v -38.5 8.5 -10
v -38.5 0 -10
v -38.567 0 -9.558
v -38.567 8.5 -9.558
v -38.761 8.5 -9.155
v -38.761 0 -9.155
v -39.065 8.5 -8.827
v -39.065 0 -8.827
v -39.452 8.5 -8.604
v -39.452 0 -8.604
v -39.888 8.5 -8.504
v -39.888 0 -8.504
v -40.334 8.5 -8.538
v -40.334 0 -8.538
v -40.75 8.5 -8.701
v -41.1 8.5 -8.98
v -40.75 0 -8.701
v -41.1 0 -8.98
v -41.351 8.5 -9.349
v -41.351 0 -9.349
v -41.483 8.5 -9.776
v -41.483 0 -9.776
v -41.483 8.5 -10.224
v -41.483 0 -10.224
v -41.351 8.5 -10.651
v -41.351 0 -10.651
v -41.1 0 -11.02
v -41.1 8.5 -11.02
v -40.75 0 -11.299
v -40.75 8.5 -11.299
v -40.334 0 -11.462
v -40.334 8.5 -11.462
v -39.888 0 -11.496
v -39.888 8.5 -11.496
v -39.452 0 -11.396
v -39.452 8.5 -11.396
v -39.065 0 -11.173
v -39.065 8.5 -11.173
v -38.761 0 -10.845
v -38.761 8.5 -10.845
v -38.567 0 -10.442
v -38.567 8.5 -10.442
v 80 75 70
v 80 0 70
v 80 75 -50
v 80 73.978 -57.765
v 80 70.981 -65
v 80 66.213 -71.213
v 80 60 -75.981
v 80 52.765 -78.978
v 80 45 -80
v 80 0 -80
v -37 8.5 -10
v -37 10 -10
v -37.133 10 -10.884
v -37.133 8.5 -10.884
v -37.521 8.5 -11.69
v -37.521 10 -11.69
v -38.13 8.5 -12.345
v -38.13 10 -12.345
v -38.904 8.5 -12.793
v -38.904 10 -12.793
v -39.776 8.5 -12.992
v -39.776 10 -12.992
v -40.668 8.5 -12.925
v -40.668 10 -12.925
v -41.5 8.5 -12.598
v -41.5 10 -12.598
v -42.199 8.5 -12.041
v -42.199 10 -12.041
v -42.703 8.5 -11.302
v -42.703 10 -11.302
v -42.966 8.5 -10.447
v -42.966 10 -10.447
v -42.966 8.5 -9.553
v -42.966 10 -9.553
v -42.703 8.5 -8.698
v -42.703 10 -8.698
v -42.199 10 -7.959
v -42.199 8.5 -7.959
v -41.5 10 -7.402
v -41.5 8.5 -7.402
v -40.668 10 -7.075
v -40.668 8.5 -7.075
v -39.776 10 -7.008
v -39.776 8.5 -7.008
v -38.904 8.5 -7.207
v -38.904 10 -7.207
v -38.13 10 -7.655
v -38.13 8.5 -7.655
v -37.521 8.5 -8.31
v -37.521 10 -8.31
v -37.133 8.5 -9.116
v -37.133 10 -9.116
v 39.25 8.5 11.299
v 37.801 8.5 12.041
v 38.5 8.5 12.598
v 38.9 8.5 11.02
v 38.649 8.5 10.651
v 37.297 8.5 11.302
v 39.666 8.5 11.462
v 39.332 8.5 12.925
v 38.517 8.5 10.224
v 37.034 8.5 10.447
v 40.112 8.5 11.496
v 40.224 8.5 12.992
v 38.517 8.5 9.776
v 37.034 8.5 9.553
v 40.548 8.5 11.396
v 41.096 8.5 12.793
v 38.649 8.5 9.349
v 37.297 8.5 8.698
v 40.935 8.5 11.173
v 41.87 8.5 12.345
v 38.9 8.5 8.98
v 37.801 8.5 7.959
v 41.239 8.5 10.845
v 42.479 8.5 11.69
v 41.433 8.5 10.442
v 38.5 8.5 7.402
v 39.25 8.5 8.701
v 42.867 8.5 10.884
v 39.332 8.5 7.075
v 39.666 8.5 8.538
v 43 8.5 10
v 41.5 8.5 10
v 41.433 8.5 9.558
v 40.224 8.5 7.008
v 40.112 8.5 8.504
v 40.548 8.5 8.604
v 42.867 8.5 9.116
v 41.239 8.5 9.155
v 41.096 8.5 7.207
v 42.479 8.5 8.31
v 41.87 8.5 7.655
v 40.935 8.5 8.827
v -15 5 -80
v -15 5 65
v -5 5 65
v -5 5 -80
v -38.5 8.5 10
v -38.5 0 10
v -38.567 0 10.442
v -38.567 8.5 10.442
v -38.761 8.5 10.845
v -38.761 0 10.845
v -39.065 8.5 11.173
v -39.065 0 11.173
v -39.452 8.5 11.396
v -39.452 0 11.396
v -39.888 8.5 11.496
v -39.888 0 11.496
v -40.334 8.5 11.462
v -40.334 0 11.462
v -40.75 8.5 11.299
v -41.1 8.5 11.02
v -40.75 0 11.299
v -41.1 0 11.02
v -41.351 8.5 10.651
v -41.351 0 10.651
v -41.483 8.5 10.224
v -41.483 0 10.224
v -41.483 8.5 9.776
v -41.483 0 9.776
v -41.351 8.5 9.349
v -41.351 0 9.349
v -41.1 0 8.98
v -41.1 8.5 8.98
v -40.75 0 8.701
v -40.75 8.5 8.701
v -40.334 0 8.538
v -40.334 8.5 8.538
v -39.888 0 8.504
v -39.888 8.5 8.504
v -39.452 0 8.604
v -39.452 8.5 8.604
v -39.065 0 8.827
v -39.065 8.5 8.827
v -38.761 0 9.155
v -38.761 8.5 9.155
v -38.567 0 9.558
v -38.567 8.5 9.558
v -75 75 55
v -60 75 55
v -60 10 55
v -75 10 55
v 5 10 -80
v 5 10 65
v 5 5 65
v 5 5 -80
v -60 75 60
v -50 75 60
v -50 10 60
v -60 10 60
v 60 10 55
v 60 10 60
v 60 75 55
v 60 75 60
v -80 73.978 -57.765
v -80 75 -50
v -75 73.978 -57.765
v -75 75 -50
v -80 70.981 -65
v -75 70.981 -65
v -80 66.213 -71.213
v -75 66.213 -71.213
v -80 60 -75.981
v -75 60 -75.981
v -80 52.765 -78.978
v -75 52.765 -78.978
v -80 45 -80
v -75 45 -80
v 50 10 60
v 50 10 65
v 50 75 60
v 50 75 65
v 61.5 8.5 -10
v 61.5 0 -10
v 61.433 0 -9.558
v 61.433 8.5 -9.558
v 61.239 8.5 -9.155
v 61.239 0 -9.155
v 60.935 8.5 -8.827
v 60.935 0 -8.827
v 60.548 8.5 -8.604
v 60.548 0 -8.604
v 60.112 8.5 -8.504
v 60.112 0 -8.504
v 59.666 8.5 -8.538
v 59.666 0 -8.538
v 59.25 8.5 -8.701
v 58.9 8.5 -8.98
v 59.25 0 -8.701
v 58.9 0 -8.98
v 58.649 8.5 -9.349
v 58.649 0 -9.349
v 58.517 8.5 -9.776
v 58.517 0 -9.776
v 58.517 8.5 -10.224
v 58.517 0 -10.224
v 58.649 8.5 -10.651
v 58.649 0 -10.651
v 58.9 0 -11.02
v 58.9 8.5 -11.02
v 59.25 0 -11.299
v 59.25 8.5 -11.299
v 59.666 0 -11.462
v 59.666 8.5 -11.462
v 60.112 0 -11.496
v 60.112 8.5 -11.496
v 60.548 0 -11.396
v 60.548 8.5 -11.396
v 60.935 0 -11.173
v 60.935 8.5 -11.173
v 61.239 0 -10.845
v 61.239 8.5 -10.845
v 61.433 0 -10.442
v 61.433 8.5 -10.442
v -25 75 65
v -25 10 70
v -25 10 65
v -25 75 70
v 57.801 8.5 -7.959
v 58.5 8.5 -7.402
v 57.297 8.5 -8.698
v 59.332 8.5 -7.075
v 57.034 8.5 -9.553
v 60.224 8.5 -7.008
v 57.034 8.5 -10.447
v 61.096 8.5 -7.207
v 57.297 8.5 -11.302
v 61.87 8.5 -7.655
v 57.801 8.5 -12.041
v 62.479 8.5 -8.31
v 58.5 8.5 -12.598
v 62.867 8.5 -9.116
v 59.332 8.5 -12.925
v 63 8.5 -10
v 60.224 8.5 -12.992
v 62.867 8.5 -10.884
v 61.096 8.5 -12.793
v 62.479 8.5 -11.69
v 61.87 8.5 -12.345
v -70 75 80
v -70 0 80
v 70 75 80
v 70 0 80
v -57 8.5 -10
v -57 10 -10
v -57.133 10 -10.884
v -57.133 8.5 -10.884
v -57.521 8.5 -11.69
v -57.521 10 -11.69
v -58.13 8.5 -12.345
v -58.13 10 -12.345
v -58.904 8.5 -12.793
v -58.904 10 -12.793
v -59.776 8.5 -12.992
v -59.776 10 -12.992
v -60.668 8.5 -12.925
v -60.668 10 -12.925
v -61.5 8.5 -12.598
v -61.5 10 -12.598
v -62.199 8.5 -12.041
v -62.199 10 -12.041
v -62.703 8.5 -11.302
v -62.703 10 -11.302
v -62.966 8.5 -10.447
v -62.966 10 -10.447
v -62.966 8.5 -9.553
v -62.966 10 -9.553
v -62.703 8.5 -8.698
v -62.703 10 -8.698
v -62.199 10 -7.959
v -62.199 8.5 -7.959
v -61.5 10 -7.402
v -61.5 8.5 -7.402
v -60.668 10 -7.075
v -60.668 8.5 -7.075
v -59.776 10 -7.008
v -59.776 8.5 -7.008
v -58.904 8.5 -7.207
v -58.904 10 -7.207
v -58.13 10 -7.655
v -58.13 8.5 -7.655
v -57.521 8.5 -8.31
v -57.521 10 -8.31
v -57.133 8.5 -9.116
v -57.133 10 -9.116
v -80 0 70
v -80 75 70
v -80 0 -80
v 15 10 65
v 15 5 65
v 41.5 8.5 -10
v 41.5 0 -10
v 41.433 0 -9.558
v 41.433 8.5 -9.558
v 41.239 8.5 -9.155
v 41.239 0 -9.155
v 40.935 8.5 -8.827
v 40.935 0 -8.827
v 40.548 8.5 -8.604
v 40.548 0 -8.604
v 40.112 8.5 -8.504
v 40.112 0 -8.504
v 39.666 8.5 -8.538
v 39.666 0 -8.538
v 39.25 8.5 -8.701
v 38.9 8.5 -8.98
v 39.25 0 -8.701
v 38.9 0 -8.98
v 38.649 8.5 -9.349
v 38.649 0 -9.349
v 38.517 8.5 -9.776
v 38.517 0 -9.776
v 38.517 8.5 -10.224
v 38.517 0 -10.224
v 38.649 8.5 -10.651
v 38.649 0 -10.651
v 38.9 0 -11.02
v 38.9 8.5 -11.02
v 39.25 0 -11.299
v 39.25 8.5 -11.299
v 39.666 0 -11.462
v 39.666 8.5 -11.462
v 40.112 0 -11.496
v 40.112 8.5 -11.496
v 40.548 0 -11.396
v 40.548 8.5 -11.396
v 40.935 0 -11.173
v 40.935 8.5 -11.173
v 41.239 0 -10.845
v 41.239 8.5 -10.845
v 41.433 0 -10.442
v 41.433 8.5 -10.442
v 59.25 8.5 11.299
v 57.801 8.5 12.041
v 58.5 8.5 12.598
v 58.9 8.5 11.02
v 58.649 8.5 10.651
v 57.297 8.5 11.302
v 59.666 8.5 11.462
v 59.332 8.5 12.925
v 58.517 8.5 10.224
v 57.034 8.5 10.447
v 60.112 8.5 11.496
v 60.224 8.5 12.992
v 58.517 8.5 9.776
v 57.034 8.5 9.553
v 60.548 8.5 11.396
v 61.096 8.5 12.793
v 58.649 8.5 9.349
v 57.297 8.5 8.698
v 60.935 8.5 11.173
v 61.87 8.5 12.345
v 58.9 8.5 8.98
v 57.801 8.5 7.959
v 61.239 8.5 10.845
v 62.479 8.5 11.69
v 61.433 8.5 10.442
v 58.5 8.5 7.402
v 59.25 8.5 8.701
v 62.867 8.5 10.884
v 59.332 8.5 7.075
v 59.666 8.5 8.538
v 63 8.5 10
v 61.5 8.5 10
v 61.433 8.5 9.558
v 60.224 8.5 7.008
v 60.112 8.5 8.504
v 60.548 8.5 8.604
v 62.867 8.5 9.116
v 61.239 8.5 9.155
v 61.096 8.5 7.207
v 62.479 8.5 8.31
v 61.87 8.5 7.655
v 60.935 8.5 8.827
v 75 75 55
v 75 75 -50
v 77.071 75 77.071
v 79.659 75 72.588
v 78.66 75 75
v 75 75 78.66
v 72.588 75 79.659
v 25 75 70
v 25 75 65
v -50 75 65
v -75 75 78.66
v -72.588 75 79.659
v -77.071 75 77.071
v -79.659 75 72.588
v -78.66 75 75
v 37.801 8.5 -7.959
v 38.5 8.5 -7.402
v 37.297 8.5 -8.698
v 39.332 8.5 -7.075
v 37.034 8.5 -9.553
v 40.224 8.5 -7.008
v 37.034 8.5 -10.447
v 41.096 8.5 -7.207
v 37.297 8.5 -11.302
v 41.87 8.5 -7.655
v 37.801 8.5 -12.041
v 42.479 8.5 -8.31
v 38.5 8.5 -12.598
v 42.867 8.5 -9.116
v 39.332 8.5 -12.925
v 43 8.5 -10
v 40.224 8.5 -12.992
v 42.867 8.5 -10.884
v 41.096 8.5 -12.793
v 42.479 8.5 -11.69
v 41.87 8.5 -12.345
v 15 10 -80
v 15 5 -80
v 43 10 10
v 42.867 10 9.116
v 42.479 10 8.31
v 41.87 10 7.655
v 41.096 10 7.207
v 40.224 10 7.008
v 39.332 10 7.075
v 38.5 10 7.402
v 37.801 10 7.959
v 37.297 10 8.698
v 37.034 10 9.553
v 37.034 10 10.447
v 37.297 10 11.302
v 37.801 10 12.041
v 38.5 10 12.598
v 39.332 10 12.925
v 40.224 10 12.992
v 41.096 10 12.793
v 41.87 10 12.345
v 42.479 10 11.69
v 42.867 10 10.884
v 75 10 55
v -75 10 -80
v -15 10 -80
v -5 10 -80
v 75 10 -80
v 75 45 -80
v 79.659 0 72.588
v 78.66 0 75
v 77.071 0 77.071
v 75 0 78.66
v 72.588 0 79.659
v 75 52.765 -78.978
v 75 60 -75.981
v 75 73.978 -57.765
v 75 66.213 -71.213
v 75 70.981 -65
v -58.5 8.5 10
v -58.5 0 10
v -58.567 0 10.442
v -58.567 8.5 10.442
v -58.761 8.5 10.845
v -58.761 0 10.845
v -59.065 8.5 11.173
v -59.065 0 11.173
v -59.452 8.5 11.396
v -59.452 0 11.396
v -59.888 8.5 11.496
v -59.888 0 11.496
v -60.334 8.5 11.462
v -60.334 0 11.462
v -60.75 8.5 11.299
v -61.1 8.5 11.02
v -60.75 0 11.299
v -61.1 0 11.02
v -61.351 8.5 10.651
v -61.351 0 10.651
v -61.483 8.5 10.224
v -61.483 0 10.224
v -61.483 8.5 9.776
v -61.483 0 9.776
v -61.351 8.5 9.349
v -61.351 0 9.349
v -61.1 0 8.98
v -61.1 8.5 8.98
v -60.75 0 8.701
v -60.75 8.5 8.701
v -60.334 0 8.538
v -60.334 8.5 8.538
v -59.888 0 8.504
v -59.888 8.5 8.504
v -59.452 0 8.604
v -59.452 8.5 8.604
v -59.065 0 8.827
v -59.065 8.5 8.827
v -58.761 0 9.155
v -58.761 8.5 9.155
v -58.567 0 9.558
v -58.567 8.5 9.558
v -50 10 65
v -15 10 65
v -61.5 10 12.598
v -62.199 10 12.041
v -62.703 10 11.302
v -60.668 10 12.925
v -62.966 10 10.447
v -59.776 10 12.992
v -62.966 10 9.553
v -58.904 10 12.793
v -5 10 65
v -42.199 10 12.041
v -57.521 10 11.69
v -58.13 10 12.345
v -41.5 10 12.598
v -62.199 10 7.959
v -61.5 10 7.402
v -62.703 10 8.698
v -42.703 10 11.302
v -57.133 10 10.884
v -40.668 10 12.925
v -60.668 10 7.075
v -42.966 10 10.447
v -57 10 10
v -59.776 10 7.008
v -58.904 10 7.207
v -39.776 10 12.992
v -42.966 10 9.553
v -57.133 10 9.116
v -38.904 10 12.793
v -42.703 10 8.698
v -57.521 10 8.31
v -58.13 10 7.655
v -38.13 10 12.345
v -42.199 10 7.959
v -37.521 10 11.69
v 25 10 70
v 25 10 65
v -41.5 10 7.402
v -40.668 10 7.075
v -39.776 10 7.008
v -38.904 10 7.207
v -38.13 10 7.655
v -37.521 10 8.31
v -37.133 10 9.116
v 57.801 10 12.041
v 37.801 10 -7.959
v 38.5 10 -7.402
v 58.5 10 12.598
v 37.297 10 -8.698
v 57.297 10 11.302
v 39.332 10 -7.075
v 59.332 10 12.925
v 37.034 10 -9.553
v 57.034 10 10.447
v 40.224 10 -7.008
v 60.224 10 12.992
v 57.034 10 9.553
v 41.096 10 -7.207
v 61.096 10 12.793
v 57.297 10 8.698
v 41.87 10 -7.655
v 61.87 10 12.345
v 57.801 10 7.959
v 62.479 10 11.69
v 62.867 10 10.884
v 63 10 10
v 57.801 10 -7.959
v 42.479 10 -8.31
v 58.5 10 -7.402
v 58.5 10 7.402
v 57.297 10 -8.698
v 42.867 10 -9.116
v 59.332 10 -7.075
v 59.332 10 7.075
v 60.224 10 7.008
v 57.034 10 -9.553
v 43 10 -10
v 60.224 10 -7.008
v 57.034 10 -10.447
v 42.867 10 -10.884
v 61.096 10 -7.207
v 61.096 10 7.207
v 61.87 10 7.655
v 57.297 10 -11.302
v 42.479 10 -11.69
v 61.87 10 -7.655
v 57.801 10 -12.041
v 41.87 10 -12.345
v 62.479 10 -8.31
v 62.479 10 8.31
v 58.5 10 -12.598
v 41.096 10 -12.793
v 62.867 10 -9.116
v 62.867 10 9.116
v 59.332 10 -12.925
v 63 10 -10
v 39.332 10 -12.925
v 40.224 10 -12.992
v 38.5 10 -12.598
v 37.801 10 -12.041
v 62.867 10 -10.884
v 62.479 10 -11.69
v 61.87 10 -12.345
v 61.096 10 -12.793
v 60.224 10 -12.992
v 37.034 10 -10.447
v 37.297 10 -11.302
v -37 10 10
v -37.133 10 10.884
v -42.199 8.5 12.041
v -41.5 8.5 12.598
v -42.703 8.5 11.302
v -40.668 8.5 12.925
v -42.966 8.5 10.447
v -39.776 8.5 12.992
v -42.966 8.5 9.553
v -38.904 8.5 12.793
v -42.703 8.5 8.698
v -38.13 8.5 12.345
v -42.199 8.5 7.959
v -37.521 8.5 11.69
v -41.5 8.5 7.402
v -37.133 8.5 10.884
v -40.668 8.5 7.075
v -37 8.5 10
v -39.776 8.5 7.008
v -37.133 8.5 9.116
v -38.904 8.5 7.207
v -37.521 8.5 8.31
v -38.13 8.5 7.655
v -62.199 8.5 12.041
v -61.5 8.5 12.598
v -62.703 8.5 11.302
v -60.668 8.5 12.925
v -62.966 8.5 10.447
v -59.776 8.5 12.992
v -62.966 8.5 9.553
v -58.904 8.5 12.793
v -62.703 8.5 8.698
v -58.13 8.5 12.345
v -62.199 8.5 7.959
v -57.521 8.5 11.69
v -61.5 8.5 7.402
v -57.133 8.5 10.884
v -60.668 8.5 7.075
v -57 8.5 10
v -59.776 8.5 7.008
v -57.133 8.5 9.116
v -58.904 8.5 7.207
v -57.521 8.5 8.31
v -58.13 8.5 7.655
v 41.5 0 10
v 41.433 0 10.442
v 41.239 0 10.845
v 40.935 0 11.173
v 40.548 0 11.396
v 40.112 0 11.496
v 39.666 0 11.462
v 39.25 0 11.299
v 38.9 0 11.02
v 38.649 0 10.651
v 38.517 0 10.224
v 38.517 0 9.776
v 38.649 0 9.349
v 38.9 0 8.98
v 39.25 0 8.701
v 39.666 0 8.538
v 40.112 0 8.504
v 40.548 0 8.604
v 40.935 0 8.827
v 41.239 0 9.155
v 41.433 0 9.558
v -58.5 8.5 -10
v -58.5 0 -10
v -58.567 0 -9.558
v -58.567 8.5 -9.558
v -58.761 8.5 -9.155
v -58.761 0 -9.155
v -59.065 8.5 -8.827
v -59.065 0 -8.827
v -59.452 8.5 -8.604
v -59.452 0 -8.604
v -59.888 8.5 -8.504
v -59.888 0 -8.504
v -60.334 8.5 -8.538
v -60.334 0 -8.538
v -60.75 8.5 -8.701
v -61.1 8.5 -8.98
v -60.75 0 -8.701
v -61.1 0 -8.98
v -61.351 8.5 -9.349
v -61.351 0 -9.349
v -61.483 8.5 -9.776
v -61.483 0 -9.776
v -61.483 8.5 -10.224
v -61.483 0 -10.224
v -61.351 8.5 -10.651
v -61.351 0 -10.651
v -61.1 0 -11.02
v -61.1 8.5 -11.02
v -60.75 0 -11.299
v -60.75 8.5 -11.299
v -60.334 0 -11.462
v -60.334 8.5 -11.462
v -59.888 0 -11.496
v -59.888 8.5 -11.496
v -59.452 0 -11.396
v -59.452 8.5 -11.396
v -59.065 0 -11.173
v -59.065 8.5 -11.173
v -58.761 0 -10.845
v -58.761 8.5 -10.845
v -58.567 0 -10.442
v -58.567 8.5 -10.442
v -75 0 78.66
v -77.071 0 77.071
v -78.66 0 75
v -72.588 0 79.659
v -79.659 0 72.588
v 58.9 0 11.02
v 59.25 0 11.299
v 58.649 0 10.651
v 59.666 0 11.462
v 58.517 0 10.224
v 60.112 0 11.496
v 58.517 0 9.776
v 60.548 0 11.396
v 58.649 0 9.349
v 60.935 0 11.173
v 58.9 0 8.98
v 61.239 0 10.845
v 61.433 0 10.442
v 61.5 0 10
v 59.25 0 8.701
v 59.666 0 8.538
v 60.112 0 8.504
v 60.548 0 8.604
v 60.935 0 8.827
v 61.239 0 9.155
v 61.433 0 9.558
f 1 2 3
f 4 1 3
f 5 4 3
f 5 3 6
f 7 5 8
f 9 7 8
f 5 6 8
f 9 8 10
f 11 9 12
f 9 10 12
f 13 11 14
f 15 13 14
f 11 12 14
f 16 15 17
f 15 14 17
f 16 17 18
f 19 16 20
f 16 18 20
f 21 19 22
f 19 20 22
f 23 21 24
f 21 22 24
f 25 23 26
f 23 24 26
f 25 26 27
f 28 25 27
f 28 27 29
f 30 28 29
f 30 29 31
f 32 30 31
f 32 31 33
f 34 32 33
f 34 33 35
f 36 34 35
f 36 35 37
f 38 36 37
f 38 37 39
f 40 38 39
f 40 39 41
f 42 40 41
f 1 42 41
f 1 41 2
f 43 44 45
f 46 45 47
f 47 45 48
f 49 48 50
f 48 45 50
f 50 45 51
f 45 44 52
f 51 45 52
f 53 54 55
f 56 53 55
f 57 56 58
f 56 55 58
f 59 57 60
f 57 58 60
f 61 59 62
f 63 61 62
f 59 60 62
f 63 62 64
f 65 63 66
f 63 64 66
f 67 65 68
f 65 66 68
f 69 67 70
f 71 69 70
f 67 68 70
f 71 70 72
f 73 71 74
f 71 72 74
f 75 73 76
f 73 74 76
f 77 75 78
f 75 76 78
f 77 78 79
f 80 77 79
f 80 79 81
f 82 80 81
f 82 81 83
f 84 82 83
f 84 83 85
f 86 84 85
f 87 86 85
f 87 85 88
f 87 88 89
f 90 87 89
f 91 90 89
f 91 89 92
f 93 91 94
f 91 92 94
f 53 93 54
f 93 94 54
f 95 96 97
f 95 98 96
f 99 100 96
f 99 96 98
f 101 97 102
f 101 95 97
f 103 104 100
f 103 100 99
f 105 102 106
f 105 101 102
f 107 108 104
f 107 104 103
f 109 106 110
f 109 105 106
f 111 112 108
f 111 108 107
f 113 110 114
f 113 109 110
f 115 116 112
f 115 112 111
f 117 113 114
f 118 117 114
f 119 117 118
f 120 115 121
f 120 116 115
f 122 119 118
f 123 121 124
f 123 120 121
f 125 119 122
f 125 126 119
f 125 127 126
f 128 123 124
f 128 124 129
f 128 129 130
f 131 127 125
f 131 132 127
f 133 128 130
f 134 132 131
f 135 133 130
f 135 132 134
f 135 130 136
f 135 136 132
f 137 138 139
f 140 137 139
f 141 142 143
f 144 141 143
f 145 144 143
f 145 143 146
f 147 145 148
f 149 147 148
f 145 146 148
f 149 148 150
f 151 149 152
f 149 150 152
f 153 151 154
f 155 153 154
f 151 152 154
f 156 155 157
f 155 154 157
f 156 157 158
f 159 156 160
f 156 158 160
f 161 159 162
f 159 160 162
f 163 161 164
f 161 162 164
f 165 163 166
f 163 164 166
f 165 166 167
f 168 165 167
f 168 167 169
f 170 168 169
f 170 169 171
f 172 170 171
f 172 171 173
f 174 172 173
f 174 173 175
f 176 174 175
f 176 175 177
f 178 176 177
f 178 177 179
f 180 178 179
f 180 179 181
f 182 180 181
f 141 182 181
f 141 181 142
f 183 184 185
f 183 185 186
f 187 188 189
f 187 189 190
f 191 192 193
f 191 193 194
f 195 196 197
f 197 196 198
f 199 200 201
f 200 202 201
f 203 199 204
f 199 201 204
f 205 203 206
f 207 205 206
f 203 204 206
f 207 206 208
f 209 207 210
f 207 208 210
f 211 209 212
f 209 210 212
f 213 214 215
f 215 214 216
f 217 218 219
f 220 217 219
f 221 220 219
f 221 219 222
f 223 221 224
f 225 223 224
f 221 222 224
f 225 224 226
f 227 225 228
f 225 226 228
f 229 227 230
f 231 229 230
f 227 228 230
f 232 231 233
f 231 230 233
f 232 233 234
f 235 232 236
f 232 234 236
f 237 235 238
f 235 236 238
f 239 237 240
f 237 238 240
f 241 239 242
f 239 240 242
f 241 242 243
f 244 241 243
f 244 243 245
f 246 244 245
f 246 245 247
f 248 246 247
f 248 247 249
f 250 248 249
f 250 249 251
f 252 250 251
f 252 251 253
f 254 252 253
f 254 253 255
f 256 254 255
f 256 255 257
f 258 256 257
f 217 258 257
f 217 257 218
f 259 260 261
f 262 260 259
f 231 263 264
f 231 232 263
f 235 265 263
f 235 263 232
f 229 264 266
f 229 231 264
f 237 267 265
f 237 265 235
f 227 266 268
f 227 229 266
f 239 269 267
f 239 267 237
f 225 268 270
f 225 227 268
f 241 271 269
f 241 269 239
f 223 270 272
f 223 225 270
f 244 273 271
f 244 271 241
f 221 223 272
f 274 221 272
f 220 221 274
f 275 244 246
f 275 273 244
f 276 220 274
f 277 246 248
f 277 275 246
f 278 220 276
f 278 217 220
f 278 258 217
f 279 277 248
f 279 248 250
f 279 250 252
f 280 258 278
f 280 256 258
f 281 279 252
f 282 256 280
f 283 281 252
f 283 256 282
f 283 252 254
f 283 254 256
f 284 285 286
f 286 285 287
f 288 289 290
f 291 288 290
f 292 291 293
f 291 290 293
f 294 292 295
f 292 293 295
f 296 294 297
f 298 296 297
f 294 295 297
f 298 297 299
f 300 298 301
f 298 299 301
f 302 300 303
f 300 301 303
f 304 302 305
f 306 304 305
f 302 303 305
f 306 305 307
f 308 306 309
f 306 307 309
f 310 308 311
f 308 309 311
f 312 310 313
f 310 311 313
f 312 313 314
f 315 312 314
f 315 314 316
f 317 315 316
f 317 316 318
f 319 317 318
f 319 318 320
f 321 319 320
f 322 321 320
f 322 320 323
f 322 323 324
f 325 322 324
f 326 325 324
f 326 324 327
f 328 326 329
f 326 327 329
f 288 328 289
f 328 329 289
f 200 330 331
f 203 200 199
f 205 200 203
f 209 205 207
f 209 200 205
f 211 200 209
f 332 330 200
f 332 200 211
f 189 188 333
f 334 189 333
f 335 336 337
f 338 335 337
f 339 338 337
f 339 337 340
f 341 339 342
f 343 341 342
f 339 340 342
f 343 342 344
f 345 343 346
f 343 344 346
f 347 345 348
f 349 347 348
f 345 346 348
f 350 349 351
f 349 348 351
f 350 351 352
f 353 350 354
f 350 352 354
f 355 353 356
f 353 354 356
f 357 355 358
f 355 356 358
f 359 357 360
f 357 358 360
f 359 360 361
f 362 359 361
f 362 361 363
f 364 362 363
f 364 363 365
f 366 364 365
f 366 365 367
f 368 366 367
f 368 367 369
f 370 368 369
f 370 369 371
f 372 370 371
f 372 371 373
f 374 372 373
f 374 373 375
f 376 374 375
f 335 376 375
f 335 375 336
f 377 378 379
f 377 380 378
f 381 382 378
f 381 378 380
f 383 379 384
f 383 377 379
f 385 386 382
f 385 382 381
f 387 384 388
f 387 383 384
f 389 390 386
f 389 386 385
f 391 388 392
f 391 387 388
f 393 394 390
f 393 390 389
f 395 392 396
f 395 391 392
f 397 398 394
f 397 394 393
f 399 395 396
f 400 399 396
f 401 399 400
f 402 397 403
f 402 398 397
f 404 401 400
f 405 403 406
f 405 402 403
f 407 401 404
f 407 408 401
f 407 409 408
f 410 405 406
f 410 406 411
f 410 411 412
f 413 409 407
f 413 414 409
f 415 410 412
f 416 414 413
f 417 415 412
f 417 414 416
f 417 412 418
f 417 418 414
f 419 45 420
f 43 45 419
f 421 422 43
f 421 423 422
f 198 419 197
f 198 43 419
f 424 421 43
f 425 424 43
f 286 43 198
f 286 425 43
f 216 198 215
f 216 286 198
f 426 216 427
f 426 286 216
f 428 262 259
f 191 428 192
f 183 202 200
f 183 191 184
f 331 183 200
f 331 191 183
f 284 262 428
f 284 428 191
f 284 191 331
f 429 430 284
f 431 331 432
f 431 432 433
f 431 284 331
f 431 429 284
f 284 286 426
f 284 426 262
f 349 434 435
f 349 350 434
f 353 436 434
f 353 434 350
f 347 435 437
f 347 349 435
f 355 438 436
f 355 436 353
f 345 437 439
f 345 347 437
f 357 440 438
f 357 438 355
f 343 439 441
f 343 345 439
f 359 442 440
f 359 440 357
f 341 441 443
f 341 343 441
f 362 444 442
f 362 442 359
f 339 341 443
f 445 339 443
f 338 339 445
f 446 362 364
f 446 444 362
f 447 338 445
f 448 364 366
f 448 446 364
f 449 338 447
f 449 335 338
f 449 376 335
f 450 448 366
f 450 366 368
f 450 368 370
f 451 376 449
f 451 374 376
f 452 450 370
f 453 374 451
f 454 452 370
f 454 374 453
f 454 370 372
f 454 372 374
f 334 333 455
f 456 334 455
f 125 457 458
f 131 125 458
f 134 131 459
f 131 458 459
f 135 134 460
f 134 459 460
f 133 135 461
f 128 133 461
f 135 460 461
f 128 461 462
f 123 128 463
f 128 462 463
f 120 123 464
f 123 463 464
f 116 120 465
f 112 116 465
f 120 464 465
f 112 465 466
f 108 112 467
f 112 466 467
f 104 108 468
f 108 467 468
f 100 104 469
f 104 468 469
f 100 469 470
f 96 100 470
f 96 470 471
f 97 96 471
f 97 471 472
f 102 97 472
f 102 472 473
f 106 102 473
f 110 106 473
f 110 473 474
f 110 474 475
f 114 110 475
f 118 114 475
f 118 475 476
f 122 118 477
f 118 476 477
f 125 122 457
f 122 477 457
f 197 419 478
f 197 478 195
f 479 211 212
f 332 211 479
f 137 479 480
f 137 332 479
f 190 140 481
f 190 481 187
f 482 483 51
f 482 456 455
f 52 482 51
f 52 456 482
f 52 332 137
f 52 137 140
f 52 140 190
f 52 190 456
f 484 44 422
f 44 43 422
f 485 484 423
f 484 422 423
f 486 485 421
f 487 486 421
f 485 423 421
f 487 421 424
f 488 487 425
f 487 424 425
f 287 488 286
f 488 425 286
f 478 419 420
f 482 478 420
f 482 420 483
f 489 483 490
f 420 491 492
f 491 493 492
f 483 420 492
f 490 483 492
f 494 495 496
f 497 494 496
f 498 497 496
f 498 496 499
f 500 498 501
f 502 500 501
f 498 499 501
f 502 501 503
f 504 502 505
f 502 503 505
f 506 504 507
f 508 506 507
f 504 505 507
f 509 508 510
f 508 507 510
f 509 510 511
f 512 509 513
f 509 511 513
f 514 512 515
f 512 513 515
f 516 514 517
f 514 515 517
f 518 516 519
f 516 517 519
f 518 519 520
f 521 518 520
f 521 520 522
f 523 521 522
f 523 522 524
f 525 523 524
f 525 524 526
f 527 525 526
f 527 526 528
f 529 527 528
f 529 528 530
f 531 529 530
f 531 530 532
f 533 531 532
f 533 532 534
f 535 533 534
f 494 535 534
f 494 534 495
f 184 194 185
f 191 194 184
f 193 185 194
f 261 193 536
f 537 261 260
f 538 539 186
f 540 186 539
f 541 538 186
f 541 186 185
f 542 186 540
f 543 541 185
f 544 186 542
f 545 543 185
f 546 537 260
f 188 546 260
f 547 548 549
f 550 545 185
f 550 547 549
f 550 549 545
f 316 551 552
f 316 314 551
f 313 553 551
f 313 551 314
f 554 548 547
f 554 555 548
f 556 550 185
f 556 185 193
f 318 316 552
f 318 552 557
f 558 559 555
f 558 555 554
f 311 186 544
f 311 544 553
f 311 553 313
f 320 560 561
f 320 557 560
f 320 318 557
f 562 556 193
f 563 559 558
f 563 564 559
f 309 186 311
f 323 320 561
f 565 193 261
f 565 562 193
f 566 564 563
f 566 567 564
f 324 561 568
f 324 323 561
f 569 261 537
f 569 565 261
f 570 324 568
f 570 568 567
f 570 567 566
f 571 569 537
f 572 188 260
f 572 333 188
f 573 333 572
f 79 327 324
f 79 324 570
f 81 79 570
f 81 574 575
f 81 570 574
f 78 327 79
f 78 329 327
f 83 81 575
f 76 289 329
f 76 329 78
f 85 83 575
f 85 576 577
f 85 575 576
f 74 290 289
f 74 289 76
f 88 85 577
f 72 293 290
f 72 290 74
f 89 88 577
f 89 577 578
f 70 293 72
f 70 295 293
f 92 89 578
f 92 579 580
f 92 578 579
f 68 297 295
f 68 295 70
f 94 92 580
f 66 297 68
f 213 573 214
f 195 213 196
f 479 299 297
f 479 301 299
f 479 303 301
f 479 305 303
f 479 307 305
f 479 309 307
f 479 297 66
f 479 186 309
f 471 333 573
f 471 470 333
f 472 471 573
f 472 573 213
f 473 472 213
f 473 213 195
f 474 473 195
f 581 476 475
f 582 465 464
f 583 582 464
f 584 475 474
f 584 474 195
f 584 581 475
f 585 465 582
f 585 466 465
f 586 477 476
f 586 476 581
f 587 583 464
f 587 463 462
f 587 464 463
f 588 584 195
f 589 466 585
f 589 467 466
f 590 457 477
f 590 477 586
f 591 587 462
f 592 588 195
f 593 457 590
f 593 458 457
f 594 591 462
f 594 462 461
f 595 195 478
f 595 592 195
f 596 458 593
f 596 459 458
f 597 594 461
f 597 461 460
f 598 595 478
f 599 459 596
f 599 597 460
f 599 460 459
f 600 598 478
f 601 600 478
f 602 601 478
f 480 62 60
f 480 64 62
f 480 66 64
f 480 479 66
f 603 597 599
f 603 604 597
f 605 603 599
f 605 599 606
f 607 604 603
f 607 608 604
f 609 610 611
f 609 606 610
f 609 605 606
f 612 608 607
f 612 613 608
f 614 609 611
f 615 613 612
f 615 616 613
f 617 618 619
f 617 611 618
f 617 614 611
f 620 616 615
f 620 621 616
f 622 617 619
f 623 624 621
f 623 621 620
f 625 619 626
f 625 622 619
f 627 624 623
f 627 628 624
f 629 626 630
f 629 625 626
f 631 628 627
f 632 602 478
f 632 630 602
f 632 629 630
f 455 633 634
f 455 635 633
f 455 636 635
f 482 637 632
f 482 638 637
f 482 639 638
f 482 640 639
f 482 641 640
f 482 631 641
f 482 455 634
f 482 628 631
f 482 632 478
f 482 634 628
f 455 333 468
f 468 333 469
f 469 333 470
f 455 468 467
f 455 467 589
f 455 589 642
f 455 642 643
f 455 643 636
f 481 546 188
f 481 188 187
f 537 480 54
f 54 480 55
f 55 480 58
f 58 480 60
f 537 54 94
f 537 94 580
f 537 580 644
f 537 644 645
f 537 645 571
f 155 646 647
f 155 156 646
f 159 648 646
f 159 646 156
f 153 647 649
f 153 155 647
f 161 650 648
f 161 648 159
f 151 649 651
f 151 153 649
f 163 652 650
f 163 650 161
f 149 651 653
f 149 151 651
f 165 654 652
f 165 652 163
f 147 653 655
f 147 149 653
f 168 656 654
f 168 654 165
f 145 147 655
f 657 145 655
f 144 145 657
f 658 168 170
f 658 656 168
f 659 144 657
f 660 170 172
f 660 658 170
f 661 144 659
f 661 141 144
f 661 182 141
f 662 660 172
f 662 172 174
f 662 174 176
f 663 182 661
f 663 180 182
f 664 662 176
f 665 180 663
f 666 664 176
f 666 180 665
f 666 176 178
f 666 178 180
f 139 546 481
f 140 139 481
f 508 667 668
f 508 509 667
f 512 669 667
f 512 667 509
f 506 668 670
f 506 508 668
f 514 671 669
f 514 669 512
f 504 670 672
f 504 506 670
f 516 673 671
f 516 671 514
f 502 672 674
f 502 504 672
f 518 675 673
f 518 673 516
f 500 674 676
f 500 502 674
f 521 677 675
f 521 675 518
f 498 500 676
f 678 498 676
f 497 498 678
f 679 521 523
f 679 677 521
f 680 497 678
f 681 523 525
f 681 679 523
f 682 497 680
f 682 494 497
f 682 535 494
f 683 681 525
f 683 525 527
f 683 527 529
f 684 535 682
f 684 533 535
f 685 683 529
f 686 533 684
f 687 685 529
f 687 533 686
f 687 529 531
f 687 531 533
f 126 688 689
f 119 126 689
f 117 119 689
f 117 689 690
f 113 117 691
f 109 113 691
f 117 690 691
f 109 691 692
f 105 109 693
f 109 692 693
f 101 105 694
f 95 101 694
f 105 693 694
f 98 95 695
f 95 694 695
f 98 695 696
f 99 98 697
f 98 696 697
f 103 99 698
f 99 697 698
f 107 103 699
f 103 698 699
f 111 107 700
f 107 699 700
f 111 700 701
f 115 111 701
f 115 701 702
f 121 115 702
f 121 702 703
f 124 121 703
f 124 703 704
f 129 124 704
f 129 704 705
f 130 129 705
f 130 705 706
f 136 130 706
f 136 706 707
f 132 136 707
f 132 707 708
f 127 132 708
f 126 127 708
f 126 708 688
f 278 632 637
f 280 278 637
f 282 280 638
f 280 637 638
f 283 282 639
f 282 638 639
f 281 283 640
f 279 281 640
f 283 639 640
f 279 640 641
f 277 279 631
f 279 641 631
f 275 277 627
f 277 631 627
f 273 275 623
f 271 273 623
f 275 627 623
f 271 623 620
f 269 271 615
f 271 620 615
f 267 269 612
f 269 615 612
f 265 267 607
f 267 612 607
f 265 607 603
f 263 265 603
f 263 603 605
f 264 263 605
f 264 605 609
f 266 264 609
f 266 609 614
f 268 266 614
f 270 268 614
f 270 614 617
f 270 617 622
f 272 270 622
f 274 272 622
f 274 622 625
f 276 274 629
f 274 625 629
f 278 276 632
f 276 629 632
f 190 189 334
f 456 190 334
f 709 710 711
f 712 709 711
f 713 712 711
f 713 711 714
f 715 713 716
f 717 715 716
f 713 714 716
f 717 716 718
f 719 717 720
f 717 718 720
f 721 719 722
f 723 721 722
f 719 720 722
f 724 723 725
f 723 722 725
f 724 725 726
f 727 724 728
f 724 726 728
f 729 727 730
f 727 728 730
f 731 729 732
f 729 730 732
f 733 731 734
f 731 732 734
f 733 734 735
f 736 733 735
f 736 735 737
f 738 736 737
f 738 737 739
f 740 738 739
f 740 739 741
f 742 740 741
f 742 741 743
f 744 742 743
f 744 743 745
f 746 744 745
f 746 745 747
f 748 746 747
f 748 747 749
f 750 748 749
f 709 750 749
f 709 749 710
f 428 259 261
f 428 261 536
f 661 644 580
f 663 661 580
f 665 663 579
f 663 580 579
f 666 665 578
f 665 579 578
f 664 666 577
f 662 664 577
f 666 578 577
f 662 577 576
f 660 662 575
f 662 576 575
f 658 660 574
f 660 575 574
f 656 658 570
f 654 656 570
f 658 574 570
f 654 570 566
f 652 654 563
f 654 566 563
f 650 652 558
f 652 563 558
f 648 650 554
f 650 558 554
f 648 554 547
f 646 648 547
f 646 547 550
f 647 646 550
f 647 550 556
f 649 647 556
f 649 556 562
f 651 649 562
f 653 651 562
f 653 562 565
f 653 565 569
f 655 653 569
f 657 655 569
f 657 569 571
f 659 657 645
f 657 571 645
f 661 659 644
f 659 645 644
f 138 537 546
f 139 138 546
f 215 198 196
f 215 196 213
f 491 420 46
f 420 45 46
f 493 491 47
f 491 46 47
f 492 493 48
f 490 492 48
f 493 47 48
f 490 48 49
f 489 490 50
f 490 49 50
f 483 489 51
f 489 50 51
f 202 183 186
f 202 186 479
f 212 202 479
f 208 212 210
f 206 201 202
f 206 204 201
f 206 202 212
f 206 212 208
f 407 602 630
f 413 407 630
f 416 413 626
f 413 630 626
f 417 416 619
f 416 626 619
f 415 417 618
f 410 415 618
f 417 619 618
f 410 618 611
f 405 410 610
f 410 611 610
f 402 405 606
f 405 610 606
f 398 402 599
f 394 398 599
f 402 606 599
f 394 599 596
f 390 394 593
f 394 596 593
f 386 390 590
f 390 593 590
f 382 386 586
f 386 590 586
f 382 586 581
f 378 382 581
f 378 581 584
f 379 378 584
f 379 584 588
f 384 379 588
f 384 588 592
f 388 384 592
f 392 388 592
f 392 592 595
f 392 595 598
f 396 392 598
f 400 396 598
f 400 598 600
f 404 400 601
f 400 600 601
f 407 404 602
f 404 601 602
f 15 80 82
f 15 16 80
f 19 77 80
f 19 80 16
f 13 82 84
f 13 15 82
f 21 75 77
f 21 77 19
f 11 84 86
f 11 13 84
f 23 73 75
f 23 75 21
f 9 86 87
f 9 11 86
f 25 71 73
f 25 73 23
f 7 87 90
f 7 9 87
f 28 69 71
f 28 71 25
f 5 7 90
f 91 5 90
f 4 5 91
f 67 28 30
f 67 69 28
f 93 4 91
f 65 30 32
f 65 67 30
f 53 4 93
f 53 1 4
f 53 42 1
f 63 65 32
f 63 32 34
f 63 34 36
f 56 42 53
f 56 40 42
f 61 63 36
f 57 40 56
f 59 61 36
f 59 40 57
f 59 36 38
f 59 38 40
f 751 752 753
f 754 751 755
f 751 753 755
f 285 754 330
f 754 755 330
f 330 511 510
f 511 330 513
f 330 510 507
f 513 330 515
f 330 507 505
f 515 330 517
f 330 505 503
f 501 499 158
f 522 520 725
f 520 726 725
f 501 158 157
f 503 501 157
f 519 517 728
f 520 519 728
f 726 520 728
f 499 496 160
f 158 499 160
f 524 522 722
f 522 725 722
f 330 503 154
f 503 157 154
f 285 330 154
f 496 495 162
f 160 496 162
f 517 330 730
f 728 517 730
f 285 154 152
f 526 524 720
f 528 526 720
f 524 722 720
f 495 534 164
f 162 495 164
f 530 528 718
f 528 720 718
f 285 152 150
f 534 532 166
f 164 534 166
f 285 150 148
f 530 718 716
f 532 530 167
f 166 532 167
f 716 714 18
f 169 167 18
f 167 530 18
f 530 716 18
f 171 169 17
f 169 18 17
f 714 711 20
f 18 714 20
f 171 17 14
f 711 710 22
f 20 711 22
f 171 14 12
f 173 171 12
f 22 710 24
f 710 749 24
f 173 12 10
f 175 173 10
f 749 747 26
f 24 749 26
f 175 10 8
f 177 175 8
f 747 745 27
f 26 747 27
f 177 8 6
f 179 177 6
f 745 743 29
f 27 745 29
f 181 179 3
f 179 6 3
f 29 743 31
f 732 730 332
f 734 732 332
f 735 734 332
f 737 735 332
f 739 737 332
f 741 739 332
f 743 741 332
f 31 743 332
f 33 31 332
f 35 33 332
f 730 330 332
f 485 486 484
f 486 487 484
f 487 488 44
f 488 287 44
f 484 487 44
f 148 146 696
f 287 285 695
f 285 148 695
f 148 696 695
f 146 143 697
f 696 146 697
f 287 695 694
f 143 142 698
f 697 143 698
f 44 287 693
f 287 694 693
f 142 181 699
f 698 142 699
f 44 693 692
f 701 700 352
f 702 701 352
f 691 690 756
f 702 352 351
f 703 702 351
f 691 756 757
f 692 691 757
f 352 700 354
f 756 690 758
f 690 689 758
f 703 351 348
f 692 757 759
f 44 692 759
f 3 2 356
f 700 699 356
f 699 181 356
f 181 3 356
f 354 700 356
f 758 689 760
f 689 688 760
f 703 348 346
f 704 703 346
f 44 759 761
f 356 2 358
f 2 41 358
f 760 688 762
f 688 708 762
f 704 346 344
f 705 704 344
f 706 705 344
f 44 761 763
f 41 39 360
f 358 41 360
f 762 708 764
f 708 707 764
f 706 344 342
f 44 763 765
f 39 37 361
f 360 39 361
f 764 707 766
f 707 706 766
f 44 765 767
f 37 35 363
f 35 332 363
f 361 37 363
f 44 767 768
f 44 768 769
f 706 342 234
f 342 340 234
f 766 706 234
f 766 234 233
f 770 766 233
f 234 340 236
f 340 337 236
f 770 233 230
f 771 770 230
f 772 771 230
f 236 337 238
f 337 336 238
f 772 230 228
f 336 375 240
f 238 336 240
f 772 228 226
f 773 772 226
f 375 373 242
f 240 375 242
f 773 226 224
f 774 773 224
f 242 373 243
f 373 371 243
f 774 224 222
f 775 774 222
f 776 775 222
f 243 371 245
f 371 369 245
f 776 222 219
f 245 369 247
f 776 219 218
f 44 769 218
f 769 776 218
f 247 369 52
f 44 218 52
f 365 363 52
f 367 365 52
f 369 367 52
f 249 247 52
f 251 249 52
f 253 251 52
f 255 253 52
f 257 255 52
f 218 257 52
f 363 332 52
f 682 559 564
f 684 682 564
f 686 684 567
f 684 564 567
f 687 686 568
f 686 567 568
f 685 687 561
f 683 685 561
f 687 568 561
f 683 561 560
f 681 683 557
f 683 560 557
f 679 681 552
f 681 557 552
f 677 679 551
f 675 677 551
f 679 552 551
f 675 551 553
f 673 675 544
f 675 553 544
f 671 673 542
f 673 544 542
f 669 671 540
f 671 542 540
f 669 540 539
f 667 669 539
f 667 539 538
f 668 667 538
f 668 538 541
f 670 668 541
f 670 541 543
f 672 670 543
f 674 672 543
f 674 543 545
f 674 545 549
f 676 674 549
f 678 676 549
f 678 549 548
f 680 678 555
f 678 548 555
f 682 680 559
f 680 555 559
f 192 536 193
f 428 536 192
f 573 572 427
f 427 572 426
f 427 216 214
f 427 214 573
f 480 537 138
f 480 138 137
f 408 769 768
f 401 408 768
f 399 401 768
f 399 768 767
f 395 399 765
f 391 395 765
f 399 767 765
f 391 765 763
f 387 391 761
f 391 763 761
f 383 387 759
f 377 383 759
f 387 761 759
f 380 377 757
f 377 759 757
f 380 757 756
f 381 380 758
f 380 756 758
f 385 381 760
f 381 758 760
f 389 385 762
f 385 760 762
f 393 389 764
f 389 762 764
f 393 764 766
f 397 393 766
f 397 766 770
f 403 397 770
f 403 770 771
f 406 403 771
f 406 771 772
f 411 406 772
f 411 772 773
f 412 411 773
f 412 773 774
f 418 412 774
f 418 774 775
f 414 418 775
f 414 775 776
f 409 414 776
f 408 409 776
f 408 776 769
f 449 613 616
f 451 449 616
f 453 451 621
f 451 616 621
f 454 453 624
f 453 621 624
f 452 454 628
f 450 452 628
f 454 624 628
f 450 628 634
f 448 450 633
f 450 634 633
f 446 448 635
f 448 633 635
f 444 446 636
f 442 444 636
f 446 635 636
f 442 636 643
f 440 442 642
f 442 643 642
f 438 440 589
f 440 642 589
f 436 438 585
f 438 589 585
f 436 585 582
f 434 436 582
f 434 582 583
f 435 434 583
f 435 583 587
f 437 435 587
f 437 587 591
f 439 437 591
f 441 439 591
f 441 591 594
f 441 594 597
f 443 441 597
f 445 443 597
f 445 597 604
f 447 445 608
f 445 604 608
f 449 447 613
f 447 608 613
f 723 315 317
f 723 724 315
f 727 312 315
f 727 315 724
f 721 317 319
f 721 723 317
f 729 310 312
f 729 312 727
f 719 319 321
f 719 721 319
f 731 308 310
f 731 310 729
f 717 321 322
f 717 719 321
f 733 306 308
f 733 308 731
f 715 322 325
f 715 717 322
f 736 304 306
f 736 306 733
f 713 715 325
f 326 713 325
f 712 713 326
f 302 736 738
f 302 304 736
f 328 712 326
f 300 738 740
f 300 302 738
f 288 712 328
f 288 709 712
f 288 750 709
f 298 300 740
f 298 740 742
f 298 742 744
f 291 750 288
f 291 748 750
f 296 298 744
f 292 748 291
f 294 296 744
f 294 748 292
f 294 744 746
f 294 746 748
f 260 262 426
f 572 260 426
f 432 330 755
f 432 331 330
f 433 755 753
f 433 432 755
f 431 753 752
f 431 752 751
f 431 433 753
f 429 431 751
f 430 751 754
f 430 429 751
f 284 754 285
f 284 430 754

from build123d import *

# Parameters (mm, degrees)
SKETCH1_W           = 160
SKETCH1_H           = 160
BOSS_EXTRUDE1_DEPTH = 75
SKETCH2_W           = 150
SKETCH2_H           = 150
CUT_EXTRUDE1_DEPTH  = 65
SKETCH3_W           = 15
SKETCH3_H           = 65
BOSS_EXTRUDE2_DEPTH = 15
SKETCH4_W           = 10
SKETCH4_H           = 65
BOSS_EXTRUDE3_DEPTH = 10
FILLET1_R           = 10
SKETCH11_W          = 25
SKETCH11_H          = 65
BOSS_EXTRUDE4_DEPTH = 5
FILLET2_R           = 30
SKETCH15_R          = 1.5
CUT_EXTRUDE2_DEPTH  = 10
SKETCH17_R          = 3
CUT_EXTRUDE3_DEPTH  = 1.5
SKETCH18_W          = 10
SKETCH18_H          = 145
CUT_EXTRUDE6_DEPTH  = 5


with BuildPart() as part:
    # Sketch1 → Boss-Extrude1 (new body)
    with BuildSketch(Plane(origin=(0, 0, 0), x_dir=(1, 0, 0), z_dir=(0, 1, 0))):
        Rectangle(SKETCH1_W, SKETCH1_H)
    extrude(amount=BOSS_EXTRUDE1_DEPTH)

    # Sketch2 → Cut-Extrude1 (cut)
    with BuildSketch(Plane(origin=(0, 75, 0), x_dir=(1, 0, 0), z_dir=(0, 1, 0))):
        with Locations((0, 5)):
            Rectangle(SKETCH2_W, SKETCH2_H)
    extrude(amount=-CUT_EXTRUDE1_DEPTH, mode=Mode.SUBTRACT)

    # Sketch3 → Boss-Extrude2 (add)
    with BuildSketch(Plane(origin=(0, 0, 70), x_dir=(-1, 0, 0), z_dir=(0, 0, -1))):
        with Locations((-67.5, 42.5)):
            Rectangle(SKETCH3_W, SKETCH3_H)
        with Locations((67.5, 42.5)):
            Rectangle(SKETCH3_W, SKETCH3_H)
    extrude(amount=BOSS_EXTRUDE2_DEPTH)

    # Sketch4 → Boss-Extrude3 (add)
    with BuildSketch(Plane(origin=(0, 0, 70), x_dir=(-1, 0, 0), z_dir=(0, 0, -1))):
        with Locations((-55, 42.5)):
            Rectangle(SKETCH4_W, SKETCH4_H)
        with Locations((55, 42.5)):
            Rectangle(SKETCH4_W, SKETCH4_H)
    extrude(amount=BOSS_EXTRUDE3_DEPTH)

    # Fillet1
    fillet1_edges = [part.edges().sort_by_distance(p)[0] for p in [
        (80, 37.5, 80),
        (-80, 37.5, 80),
    ]]
    fillet(fillet1_edges, radius=FILLET1_R)

    # Sketch11 → Boss-Extrude4 (add)
    with BuildSketch(Plane(origin=(0, 0, 70), x_dir=(-1, 0, 0), z_dir=(0, 0, -1))):
        with Locations((-37.5, 42.5)):
            Rectangle(SKETCH11_W, SKETCH11_H)
        with Locations((37.5, 42.5)):
            Rectangle(SKETCH11_W, SKETCH11_H)
    extrude(amount=BOSS_EXTRUDE4_DEPTH)

    # Fillet2
    fillet2_edges = [part.edges().sort_by_distance(p)[0] for p in [
        (-77.5, 75, -80),
        (77.5, 75, -80),
    ]]
    fillet(fillet2_edges, radius=FILLET2_R)

    # Sketch15 → Cut-Extrude2 (cut)
    with BuildSketch(Plane.XZ):
        with Locations((-60, 10)):
            Circle(SKETCH15_R)
        with Locations((-40, 10)):
            Circle(SKETCH15_R)
        with Locations((40, 10)):
            Circle(SKETCH15_R)
        with Locations((60, 10)):
            Circle(SKETCH15_R)
        with Locations((60, -10)):
            Circle(SKETCH15_R)
        with Locations((40, -10)):
            Circle(SKETCH15_R)
        with Locations((-40, -10)):
            Circle(SKETCH15_R)
        with Locations((-60, -10)):
            Circle(SKETCH15_R)
    extrude(amount=-CUT_EXTRUDE2_DEPTH, mode=Mode.SUBTRACT)

    # Sketch17 → Cut-Extrude3 (cut)
    with BuildSketch(Plane(origin=(0, 10, 0), x_dir=(1, 0, 0), z_dir=(0, 1, 0))):
        with Locations((-60, 10)):
            Circle(SKETCH17_R)
        with Locations((-40, 10)):
            Circle(SKETCH17_R)
        with Locations((-40, -10)):
            Circle(SKETCH17_R)
        with Locations((-60, -10)):
            Circle(SKETCH17_R)
        with Locations((40, -10)):
            Circle(SKETCH17_R)
        with Locations((60, -10)):
            Circle(SKETCH17_R)
        with Locations((40, 10)):
            Circle(SKETCH17_R)
        with Locations((60, 10)):
            Circle(SKETCH17_R)
    extrude(amount=-CUT_EXTRUDE3_DEPTH, mode=Mode.SUBTRACT)

    # Sketch18 → Cut-Extrude6 (cut)
    with BuildSketch(Plane(origin=(0, 10, 0), x_dir=(1, 0, 0), z_dir=(0, 1, 0))):
        with Locations((10, 7.5)):
            Rectangle(SKETCH18_W, SKETCH18_H)
        with Locations((-10, 7.5)):
            Rectangle(SKETCH18_W, SKETCH18_H)
    extrude(amount=-CUT_EXTRUDE6_DEPTH, mode=Mode.SUBTRACT)


solid = part.part
